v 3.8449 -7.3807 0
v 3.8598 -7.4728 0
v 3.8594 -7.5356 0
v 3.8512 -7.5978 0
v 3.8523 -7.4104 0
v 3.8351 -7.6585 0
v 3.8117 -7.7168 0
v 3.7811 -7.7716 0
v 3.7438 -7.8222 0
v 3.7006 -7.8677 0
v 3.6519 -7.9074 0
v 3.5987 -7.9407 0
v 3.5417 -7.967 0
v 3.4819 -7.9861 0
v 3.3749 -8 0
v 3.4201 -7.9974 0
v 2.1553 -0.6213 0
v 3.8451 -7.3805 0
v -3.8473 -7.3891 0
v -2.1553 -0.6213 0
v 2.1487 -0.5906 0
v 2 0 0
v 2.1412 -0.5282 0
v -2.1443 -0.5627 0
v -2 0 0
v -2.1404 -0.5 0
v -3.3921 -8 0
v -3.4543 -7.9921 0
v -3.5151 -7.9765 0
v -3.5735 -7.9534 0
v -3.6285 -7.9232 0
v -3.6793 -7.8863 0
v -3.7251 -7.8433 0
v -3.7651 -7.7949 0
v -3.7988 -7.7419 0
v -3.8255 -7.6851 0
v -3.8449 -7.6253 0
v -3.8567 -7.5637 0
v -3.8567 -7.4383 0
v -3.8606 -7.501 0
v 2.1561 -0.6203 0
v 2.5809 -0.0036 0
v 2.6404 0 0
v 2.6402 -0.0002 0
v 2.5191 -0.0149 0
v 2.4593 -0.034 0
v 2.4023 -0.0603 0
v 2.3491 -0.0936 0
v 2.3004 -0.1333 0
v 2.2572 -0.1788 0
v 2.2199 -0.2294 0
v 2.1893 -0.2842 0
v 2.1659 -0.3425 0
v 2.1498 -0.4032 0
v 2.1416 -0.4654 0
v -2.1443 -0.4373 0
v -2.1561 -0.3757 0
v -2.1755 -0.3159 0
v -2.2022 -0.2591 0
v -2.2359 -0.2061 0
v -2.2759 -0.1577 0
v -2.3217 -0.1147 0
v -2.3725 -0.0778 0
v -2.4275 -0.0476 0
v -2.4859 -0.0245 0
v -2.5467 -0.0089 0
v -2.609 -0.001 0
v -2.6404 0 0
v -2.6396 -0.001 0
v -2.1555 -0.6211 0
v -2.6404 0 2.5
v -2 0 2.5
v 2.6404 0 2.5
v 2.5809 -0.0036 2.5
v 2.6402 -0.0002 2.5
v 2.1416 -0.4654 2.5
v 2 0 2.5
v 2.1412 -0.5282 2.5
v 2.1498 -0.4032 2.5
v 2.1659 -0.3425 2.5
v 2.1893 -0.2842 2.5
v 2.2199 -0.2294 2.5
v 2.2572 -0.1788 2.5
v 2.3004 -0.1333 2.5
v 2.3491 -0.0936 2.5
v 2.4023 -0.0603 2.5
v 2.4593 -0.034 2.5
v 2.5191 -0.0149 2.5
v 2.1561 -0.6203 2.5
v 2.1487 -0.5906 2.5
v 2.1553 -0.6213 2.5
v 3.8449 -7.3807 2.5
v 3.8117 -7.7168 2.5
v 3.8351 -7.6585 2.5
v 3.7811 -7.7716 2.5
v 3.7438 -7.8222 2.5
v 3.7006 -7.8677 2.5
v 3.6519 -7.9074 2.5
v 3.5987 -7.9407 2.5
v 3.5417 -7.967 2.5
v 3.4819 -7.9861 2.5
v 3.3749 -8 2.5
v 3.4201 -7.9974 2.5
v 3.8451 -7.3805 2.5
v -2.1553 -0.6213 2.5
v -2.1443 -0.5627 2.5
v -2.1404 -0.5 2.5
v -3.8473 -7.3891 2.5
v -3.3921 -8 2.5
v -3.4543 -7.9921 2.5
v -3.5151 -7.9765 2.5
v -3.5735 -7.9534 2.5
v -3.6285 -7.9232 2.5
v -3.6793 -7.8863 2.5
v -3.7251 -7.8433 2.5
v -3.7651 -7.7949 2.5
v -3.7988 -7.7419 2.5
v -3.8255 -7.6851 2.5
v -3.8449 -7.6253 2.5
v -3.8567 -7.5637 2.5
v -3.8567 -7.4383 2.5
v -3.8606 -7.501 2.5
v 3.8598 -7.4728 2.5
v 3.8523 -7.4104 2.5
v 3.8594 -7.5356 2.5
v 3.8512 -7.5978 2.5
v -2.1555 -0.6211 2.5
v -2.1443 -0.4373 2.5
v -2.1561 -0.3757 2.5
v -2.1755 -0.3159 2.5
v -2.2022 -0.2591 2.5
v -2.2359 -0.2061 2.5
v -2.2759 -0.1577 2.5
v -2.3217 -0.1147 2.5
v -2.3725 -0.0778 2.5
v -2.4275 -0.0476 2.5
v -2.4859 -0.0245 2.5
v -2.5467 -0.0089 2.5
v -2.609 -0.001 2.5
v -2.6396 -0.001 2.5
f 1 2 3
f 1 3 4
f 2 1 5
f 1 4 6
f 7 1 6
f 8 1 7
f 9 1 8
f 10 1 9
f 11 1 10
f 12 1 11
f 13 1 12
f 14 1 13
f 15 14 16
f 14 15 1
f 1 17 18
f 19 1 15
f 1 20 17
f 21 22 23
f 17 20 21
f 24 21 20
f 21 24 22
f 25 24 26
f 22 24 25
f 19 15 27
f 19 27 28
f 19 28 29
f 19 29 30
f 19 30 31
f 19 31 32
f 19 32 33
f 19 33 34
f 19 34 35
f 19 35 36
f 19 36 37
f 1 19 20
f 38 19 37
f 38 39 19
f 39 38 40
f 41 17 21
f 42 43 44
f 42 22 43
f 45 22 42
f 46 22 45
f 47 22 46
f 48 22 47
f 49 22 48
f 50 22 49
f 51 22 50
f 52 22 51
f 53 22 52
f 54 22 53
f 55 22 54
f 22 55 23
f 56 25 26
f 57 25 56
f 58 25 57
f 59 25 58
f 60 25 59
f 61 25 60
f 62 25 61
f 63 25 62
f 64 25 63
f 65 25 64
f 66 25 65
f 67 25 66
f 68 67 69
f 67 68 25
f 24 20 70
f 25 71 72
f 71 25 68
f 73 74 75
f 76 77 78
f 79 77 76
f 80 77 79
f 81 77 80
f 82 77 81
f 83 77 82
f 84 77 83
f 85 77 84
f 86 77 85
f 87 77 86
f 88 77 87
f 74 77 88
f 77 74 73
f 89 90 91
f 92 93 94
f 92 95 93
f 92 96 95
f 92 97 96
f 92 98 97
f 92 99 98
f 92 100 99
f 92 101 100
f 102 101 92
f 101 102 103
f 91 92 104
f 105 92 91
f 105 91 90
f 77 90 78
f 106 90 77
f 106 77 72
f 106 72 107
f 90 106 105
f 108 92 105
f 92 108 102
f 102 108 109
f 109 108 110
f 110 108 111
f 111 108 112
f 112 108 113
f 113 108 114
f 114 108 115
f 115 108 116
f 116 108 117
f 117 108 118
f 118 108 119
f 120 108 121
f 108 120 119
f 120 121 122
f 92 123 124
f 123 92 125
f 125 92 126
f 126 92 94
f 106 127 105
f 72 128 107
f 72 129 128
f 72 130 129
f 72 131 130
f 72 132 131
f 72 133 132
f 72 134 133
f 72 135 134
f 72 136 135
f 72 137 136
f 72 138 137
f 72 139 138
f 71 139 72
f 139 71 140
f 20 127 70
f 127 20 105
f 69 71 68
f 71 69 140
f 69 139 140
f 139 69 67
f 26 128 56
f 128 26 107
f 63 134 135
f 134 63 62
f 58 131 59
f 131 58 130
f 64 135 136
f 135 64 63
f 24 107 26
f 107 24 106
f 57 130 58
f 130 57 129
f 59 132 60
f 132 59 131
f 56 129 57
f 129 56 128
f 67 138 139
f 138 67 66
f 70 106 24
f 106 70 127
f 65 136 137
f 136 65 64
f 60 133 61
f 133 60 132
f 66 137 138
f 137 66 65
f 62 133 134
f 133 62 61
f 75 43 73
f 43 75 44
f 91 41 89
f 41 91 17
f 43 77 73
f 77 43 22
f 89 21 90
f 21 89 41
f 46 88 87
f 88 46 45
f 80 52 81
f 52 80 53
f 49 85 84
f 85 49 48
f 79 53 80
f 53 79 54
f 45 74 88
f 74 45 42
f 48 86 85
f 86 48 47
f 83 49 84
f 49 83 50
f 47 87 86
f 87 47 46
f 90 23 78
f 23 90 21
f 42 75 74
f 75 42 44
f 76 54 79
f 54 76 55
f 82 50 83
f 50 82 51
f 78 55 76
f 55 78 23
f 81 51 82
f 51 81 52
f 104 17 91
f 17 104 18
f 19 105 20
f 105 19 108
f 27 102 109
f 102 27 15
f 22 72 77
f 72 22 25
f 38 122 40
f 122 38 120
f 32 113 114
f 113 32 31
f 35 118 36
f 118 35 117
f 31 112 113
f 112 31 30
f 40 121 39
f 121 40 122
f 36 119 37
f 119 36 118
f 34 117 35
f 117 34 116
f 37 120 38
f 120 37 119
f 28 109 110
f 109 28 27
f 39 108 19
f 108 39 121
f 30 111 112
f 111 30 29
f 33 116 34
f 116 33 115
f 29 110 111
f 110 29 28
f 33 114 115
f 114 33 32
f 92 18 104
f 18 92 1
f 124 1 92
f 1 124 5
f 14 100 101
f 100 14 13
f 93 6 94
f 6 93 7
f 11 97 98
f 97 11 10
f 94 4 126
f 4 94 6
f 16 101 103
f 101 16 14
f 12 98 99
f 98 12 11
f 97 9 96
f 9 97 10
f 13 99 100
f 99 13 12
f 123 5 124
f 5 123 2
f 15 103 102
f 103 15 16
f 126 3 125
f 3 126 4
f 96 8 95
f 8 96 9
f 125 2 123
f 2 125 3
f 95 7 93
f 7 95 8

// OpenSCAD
// file: fillets.scad
//TODO: Vector math needs correcting
module fillet(l=2, r=2, a=90, center=true, v=[1,1,0], p=[0,0,0])
{
    
    v_norm=[ v[0], -v[1], -v[2] ]/sqrt(v*v); //corrected axis of v and normalised
    rotation_vector=(v[1]==0 && v[2]==0) ? [0,0,1] : cross(v_norm, [1,0,0]); //takes into account edge case of parallel start and finish vectors resulting in zero vector for cross product
    rotation_angle=acos(v_norm*[1,0,0]);
    
    translate(p)
    rotate(a=rotation_angle, v=rotation_vector)
    translate([0, 0, center ? -l/2 : 0])
    rotate([0,0,-a/2])
    difference()
    {
        
        x2=r/tan(a/2);
        x1=x2*cos(a);
        y1=x2*sin(a);
        
        linear_extrude(l)
        polygon([ [0,0], [x2,0], [x1,y1] ]);
        
        translate([x2, r, -1])
        cylinder(r=r, h=l+2);
        
    }
    
}

//fillet($fn=50);


// l = longitudal length of the chamfer
// d = distance of the chamfer
// a = interior angle of the chamfer
// center = whether the chamfer is centered on the origin
// edge = the angle of the chamfer to the horizontal (x-y plane)
// v = a vector normal to the face of the chamfer
// p = the position of the chamfer
module chamfer(l=2, d=2, a=90, center=true, edge=0, v=[1,1,0], p=[0,0,0])
{
    
    x1=d*cos(a);
    y1=d*sin(a);
    
    v_norm=[ v[0], -v[1], -v[2] ]/sqrt(v*v); //corrected axis of v and normalised
    rotation_vector=(v[1]==0 && v[2]==0) ? [0,0,1] : cross(v_norm, [1,0,0]); //takes into account edge case of parallel start and finish vectors resulting in zero vector for cross product
    rotation_angle=acos(v_norm*[1,0,0]);
    
    translate(p)
    rotate(a=rotation_angle, v=rotation_vector)
    rotate([edge,0,0])
    translate([0, 0, center ? -l/2 : 0])
    rotate([0,0,-a/2])
    linear_extrude(l)
    polygon([ [0,0], [d,0], [x1,y1] ]);
    
}

//chamfer();
// main file
use <fillets.scad>;
$fn=50;

module dovetail(thin_w=4, thick_w=8, l=8, h=2.5, male=true, clearance=0.3, fillets=true, fillet_radius=0.5)
{
    if (male)
    {
        difference()
        {
            union()
            {
                linear_extrude(h)
                polygon([
                    [-thin_w/2, 0],
                    [thin_w/2, 0],
                    [thick_w/2, -l],
                    [-thick_w/2, -l]
                ]);
                
                if (fillets)
                {
                    theta=atan(l/(thick_w/2 - thin_w/2));
                    for (i = [-1,1]) {
                    
                        translate([i*thin_w/2,0,0])
                        rotate([0,0,45-i*(90+theta/2)])
                        fillet(l=h, r=fillet_radius, a=theta, center=false);
                        
                    }
                }
            }
            
            if (fillets)
            {
                
                theta=atan(l/(thick_w/2 - thin_w/2));
                nothing=0.001;
                for (i = [-1,1]) {
                    
                    translate([i*(thick_w/2+nothing),-l-nothing,-1])
                    rotate([0,0,45+i*(180-theta)/2])
                    fillet(l=h+2, r=fillet_radius, a=theta, center=false);
                    
                }
                
            }
            
        }
    }
    else
    {
        theta=atan(l/(thick_w/2 - thin_w/2));
        a=clearance/sin(theta);
        b=(l+clearance)*((thick_w/2 - thin_w/2)/l);
        
        pullout_distance=a*(l/(thick_w/2 - thin_w/2));
        echo(str("Dovetail axial clearance is ", pullout_distance, "mm"));
        
        difference()
        {
            union()
            {
                
                linear_extrude(h)
                polygon([
                    [-thin_w/2 - a, 0],
                    [thin_w/2 + a, 0],
                    [a + thin_w/2 + b, -l - clearance],
                    [-(a + thin_w/2 + b), -l - clearance]
                ]);
                
                //add top fillets
                if (fillets)
                {
                    for (i = [-1,1]) {
                        
                        translate([i*(a+thin_w/2),0,0])
                        rotate([0,0,45-i*(90+theta/2)])
                        fillet(l=h, r=fillet_radius, a=theta, center=false);
                    }
                }
            }
            
            //remove bottom fillets
            if (fillets)
            {
                nothing=0.001;
                for (i = [-1,1]) {
                    
                    translate([i*(a+thin_w/2+b+nothing),-l-clearance-nothing,-1])
                    rotate([0,0,45+i*(180-theta)/2])
                    fillet(l=h+2, r=fillet_radius, a=theta, center=false);
                    
                }
            }
            
        }
    }
    
}

%translate([0,0,-1])
dovetail(male=false);

dovetail(male=true);
